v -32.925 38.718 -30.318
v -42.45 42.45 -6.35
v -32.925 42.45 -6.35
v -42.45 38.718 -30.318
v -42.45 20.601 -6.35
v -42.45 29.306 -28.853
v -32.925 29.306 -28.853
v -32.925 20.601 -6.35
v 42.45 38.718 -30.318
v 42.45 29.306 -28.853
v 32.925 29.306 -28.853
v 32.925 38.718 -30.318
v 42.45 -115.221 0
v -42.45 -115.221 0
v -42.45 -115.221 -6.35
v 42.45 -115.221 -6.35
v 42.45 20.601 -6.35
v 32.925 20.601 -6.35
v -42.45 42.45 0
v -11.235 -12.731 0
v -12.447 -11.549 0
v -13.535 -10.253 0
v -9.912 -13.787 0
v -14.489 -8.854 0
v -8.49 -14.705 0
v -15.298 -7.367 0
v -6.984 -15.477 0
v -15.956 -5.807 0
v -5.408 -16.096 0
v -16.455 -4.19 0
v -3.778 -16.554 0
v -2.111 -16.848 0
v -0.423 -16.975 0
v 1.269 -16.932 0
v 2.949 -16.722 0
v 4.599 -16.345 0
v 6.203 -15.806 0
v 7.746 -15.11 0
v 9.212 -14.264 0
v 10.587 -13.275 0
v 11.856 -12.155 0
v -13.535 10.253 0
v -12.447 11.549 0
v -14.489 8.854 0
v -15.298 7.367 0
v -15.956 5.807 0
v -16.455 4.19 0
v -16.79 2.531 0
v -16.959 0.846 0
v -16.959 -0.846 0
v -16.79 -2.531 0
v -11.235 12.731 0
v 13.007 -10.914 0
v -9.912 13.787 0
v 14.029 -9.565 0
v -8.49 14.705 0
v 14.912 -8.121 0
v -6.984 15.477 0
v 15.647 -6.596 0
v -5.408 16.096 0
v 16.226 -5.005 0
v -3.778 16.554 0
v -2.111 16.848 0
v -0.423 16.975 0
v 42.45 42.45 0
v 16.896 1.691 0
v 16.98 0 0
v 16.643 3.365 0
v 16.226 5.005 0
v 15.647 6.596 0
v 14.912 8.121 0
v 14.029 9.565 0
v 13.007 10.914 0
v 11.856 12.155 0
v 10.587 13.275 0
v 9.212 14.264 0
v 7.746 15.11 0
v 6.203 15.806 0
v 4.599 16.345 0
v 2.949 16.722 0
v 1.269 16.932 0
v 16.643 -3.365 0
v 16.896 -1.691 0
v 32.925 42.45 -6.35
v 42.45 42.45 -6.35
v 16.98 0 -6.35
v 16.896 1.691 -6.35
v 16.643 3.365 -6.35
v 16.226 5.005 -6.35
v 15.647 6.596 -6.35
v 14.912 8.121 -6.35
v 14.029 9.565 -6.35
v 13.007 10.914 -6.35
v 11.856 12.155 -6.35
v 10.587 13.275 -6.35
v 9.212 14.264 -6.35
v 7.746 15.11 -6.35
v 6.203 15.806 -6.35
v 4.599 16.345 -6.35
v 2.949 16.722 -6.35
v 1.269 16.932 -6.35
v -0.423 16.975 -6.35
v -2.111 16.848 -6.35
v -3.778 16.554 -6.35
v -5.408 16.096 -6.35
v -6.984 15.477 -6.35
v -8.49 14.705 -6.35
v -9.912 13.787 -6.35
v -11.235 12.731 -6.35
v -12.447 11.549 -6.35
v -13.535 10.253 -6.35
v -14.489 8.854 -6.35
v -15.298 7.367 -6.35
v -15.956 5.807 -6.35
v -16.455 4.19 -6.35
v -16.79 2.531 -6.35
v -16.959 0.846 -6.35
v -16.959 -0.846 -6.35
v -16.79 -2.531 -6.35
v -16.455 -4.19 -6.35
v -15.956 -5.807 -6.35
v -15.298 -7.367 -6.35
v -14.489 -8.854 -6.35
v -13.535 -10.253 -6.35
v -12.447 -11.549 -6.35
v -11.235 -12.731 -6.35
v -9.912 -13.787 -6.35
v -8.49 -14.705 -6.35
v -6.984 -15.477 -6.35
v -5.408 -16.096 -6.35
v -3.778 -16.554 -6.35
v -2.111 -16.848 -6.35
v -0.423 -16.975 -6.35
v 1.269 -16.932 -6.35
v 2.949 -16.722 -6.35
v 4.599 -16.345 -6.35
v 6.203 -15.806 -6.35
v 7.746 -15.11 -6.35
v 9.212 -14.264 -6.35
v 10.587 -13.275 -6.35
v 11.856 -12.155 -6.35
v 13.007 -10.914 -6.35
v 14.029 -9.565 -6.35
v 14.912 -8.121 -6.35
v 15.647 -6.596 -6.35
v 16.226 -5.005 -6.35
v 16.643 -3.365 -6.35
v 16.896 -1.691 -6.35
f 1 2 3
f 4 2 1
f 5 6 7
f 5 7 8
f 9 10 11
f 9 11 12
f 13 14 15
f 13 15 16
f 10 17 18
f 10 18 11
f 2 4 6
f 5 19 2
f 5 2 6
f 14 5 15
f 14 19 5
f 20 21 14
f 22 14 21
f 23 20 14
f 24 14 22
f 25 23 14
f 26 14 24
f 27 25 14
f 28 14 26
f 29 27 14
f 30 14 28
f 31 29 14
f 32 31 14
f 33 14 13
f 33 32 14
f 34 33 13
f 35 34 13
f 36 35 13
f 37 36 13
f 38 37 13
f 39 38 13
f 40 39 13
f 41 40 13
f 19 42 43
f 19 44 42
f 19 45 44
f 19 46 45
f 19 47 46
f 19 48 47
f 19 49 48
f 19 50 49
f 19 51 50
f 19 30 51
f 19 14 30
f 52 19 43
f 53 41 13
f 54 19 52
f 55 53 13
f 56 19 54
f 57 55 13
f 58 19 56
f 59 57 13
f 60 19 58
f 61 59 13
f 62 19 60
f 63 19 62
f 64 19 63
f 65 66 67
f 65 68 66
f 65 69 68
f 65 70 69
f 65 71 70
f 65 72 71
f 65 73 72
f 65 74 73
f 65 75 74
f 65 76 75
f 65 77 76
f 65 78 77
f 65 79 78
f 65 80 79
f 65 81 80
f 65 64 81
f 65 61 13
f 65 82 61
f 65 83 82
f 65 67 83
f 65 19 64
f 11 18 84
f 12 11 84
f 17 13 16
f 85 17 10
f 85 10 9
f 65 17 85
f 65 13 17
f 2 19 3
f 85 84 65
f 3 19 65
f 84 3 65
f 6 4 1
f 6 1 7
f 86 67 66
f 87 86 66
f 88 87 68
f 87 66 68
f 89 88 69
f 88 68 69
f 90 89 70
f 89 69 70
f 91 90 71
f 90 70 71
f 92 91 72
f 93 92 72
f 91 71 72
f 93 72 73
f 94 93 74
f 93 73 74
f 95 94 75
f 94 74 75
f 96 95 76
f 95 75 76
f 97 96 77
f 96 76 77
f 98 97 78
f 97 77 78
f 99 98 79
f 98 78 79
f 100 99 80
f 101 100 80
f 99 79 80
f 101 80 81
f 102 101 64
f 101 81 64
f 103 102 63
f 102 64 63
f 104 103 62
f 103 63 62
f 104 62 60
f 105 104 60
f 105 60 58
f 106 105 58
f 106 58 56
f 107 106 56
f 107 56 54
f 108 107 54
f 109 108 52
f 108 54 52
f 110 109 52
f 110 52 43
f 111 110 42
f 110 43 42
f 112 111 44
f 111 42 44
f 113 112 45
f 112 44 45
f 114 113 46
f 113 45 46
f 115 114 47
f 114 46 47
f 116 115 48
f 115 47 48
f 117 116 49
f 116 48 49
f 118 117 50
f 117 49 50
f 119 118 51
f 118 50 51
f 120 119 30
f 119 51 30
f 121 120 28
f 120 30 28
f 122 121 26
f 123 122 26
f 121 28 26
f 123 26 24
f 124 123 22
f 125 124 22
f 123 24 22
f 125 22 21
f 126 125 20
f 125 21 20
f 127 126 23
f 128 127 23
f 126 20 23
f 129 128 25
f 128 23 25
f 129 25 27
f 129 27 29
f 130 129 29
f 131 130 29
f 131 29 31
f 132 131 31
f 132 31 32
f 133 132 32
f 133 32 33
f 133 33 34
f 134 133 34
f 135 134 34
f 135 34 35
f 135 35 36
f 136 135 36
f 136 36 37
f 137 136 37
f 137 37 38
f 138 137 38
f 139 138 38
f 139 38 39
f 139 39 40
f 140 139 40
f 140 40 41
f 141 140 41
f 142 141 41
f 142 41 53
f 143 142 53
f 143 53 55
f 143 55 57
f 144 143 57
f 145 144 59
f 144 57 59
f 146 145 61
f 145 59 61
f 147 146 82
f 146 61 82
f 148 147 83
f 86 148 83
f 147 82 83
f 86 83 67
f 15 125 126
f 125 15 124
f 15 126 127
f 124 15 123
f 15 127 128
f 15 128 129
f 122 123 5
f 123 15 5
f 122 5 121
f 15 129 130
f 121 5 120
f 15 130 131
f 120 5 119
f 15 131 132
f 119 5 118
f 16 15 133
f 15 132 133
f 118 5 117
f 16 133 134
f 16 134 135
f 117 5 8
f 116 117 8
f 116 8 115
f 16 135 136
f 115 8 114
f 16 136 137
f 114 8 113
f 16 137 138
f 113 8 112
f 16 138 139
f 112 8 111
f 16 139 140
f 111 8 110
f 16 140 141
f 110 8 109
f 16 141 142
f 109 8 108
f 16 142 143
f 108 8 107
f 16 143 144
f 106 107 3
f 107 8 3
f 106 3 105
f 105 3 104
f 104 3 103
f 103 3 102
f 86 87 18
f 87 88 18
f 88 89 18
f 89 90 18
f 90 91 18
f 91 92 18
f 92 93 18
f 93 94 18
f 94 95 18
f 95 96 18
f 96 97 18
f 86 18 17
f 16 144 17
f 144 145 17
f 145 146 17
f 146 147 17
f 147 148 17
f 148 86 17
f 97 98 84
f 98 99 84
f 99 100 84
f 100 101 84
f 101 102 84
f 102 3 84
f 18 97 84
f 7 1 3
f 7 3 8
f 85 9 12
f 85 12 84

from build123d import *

# Parameters (mm, degrees)
F0_W     = 84.8995
F0_H     = 157.6705
F0_R     = 16.9799
F1_DEPTH = 6.35
F3_DEPTH = 9.525
F5_DEPTH = 9.525


with BuildPart() as f1:
    # F0 (on Top) → F1 (new body)
    with BuildSketch(Plane.XY):
        with Locations((0, -36.3855)):
            Rectangle(F0_W, F0_H)
        Circle(F0_R, mode=Mode.SUBTRACT)
    extrude(amount=-F1_DEPTH)

    # F2 (on face) → F3 (join)
    with BuildSketch(Plane(origin=(-42.44975, 0, 0), x_dir=(0, -1, 0), z_dir=(-1, 0, 0))):
        Polygon((-20.600559, -6.35), (-42.44975, -6.35), (-38.717904, -30.318216), (-29.306301, -28.852831), align=None)
    extrude(amount=-F3_DEPTH)

    # F4 (on face) → F5 (join)
    with BuildSketch(Plane.YZ.offset(42.44975)):
        Polygon((38.717904, -30.318216), (42.44975, -6.35), (20.600559, -6.35), (29.306301, -28.852831), align=None)
    extrude(amount=-F5_DEPTH)


solid = f1.part
